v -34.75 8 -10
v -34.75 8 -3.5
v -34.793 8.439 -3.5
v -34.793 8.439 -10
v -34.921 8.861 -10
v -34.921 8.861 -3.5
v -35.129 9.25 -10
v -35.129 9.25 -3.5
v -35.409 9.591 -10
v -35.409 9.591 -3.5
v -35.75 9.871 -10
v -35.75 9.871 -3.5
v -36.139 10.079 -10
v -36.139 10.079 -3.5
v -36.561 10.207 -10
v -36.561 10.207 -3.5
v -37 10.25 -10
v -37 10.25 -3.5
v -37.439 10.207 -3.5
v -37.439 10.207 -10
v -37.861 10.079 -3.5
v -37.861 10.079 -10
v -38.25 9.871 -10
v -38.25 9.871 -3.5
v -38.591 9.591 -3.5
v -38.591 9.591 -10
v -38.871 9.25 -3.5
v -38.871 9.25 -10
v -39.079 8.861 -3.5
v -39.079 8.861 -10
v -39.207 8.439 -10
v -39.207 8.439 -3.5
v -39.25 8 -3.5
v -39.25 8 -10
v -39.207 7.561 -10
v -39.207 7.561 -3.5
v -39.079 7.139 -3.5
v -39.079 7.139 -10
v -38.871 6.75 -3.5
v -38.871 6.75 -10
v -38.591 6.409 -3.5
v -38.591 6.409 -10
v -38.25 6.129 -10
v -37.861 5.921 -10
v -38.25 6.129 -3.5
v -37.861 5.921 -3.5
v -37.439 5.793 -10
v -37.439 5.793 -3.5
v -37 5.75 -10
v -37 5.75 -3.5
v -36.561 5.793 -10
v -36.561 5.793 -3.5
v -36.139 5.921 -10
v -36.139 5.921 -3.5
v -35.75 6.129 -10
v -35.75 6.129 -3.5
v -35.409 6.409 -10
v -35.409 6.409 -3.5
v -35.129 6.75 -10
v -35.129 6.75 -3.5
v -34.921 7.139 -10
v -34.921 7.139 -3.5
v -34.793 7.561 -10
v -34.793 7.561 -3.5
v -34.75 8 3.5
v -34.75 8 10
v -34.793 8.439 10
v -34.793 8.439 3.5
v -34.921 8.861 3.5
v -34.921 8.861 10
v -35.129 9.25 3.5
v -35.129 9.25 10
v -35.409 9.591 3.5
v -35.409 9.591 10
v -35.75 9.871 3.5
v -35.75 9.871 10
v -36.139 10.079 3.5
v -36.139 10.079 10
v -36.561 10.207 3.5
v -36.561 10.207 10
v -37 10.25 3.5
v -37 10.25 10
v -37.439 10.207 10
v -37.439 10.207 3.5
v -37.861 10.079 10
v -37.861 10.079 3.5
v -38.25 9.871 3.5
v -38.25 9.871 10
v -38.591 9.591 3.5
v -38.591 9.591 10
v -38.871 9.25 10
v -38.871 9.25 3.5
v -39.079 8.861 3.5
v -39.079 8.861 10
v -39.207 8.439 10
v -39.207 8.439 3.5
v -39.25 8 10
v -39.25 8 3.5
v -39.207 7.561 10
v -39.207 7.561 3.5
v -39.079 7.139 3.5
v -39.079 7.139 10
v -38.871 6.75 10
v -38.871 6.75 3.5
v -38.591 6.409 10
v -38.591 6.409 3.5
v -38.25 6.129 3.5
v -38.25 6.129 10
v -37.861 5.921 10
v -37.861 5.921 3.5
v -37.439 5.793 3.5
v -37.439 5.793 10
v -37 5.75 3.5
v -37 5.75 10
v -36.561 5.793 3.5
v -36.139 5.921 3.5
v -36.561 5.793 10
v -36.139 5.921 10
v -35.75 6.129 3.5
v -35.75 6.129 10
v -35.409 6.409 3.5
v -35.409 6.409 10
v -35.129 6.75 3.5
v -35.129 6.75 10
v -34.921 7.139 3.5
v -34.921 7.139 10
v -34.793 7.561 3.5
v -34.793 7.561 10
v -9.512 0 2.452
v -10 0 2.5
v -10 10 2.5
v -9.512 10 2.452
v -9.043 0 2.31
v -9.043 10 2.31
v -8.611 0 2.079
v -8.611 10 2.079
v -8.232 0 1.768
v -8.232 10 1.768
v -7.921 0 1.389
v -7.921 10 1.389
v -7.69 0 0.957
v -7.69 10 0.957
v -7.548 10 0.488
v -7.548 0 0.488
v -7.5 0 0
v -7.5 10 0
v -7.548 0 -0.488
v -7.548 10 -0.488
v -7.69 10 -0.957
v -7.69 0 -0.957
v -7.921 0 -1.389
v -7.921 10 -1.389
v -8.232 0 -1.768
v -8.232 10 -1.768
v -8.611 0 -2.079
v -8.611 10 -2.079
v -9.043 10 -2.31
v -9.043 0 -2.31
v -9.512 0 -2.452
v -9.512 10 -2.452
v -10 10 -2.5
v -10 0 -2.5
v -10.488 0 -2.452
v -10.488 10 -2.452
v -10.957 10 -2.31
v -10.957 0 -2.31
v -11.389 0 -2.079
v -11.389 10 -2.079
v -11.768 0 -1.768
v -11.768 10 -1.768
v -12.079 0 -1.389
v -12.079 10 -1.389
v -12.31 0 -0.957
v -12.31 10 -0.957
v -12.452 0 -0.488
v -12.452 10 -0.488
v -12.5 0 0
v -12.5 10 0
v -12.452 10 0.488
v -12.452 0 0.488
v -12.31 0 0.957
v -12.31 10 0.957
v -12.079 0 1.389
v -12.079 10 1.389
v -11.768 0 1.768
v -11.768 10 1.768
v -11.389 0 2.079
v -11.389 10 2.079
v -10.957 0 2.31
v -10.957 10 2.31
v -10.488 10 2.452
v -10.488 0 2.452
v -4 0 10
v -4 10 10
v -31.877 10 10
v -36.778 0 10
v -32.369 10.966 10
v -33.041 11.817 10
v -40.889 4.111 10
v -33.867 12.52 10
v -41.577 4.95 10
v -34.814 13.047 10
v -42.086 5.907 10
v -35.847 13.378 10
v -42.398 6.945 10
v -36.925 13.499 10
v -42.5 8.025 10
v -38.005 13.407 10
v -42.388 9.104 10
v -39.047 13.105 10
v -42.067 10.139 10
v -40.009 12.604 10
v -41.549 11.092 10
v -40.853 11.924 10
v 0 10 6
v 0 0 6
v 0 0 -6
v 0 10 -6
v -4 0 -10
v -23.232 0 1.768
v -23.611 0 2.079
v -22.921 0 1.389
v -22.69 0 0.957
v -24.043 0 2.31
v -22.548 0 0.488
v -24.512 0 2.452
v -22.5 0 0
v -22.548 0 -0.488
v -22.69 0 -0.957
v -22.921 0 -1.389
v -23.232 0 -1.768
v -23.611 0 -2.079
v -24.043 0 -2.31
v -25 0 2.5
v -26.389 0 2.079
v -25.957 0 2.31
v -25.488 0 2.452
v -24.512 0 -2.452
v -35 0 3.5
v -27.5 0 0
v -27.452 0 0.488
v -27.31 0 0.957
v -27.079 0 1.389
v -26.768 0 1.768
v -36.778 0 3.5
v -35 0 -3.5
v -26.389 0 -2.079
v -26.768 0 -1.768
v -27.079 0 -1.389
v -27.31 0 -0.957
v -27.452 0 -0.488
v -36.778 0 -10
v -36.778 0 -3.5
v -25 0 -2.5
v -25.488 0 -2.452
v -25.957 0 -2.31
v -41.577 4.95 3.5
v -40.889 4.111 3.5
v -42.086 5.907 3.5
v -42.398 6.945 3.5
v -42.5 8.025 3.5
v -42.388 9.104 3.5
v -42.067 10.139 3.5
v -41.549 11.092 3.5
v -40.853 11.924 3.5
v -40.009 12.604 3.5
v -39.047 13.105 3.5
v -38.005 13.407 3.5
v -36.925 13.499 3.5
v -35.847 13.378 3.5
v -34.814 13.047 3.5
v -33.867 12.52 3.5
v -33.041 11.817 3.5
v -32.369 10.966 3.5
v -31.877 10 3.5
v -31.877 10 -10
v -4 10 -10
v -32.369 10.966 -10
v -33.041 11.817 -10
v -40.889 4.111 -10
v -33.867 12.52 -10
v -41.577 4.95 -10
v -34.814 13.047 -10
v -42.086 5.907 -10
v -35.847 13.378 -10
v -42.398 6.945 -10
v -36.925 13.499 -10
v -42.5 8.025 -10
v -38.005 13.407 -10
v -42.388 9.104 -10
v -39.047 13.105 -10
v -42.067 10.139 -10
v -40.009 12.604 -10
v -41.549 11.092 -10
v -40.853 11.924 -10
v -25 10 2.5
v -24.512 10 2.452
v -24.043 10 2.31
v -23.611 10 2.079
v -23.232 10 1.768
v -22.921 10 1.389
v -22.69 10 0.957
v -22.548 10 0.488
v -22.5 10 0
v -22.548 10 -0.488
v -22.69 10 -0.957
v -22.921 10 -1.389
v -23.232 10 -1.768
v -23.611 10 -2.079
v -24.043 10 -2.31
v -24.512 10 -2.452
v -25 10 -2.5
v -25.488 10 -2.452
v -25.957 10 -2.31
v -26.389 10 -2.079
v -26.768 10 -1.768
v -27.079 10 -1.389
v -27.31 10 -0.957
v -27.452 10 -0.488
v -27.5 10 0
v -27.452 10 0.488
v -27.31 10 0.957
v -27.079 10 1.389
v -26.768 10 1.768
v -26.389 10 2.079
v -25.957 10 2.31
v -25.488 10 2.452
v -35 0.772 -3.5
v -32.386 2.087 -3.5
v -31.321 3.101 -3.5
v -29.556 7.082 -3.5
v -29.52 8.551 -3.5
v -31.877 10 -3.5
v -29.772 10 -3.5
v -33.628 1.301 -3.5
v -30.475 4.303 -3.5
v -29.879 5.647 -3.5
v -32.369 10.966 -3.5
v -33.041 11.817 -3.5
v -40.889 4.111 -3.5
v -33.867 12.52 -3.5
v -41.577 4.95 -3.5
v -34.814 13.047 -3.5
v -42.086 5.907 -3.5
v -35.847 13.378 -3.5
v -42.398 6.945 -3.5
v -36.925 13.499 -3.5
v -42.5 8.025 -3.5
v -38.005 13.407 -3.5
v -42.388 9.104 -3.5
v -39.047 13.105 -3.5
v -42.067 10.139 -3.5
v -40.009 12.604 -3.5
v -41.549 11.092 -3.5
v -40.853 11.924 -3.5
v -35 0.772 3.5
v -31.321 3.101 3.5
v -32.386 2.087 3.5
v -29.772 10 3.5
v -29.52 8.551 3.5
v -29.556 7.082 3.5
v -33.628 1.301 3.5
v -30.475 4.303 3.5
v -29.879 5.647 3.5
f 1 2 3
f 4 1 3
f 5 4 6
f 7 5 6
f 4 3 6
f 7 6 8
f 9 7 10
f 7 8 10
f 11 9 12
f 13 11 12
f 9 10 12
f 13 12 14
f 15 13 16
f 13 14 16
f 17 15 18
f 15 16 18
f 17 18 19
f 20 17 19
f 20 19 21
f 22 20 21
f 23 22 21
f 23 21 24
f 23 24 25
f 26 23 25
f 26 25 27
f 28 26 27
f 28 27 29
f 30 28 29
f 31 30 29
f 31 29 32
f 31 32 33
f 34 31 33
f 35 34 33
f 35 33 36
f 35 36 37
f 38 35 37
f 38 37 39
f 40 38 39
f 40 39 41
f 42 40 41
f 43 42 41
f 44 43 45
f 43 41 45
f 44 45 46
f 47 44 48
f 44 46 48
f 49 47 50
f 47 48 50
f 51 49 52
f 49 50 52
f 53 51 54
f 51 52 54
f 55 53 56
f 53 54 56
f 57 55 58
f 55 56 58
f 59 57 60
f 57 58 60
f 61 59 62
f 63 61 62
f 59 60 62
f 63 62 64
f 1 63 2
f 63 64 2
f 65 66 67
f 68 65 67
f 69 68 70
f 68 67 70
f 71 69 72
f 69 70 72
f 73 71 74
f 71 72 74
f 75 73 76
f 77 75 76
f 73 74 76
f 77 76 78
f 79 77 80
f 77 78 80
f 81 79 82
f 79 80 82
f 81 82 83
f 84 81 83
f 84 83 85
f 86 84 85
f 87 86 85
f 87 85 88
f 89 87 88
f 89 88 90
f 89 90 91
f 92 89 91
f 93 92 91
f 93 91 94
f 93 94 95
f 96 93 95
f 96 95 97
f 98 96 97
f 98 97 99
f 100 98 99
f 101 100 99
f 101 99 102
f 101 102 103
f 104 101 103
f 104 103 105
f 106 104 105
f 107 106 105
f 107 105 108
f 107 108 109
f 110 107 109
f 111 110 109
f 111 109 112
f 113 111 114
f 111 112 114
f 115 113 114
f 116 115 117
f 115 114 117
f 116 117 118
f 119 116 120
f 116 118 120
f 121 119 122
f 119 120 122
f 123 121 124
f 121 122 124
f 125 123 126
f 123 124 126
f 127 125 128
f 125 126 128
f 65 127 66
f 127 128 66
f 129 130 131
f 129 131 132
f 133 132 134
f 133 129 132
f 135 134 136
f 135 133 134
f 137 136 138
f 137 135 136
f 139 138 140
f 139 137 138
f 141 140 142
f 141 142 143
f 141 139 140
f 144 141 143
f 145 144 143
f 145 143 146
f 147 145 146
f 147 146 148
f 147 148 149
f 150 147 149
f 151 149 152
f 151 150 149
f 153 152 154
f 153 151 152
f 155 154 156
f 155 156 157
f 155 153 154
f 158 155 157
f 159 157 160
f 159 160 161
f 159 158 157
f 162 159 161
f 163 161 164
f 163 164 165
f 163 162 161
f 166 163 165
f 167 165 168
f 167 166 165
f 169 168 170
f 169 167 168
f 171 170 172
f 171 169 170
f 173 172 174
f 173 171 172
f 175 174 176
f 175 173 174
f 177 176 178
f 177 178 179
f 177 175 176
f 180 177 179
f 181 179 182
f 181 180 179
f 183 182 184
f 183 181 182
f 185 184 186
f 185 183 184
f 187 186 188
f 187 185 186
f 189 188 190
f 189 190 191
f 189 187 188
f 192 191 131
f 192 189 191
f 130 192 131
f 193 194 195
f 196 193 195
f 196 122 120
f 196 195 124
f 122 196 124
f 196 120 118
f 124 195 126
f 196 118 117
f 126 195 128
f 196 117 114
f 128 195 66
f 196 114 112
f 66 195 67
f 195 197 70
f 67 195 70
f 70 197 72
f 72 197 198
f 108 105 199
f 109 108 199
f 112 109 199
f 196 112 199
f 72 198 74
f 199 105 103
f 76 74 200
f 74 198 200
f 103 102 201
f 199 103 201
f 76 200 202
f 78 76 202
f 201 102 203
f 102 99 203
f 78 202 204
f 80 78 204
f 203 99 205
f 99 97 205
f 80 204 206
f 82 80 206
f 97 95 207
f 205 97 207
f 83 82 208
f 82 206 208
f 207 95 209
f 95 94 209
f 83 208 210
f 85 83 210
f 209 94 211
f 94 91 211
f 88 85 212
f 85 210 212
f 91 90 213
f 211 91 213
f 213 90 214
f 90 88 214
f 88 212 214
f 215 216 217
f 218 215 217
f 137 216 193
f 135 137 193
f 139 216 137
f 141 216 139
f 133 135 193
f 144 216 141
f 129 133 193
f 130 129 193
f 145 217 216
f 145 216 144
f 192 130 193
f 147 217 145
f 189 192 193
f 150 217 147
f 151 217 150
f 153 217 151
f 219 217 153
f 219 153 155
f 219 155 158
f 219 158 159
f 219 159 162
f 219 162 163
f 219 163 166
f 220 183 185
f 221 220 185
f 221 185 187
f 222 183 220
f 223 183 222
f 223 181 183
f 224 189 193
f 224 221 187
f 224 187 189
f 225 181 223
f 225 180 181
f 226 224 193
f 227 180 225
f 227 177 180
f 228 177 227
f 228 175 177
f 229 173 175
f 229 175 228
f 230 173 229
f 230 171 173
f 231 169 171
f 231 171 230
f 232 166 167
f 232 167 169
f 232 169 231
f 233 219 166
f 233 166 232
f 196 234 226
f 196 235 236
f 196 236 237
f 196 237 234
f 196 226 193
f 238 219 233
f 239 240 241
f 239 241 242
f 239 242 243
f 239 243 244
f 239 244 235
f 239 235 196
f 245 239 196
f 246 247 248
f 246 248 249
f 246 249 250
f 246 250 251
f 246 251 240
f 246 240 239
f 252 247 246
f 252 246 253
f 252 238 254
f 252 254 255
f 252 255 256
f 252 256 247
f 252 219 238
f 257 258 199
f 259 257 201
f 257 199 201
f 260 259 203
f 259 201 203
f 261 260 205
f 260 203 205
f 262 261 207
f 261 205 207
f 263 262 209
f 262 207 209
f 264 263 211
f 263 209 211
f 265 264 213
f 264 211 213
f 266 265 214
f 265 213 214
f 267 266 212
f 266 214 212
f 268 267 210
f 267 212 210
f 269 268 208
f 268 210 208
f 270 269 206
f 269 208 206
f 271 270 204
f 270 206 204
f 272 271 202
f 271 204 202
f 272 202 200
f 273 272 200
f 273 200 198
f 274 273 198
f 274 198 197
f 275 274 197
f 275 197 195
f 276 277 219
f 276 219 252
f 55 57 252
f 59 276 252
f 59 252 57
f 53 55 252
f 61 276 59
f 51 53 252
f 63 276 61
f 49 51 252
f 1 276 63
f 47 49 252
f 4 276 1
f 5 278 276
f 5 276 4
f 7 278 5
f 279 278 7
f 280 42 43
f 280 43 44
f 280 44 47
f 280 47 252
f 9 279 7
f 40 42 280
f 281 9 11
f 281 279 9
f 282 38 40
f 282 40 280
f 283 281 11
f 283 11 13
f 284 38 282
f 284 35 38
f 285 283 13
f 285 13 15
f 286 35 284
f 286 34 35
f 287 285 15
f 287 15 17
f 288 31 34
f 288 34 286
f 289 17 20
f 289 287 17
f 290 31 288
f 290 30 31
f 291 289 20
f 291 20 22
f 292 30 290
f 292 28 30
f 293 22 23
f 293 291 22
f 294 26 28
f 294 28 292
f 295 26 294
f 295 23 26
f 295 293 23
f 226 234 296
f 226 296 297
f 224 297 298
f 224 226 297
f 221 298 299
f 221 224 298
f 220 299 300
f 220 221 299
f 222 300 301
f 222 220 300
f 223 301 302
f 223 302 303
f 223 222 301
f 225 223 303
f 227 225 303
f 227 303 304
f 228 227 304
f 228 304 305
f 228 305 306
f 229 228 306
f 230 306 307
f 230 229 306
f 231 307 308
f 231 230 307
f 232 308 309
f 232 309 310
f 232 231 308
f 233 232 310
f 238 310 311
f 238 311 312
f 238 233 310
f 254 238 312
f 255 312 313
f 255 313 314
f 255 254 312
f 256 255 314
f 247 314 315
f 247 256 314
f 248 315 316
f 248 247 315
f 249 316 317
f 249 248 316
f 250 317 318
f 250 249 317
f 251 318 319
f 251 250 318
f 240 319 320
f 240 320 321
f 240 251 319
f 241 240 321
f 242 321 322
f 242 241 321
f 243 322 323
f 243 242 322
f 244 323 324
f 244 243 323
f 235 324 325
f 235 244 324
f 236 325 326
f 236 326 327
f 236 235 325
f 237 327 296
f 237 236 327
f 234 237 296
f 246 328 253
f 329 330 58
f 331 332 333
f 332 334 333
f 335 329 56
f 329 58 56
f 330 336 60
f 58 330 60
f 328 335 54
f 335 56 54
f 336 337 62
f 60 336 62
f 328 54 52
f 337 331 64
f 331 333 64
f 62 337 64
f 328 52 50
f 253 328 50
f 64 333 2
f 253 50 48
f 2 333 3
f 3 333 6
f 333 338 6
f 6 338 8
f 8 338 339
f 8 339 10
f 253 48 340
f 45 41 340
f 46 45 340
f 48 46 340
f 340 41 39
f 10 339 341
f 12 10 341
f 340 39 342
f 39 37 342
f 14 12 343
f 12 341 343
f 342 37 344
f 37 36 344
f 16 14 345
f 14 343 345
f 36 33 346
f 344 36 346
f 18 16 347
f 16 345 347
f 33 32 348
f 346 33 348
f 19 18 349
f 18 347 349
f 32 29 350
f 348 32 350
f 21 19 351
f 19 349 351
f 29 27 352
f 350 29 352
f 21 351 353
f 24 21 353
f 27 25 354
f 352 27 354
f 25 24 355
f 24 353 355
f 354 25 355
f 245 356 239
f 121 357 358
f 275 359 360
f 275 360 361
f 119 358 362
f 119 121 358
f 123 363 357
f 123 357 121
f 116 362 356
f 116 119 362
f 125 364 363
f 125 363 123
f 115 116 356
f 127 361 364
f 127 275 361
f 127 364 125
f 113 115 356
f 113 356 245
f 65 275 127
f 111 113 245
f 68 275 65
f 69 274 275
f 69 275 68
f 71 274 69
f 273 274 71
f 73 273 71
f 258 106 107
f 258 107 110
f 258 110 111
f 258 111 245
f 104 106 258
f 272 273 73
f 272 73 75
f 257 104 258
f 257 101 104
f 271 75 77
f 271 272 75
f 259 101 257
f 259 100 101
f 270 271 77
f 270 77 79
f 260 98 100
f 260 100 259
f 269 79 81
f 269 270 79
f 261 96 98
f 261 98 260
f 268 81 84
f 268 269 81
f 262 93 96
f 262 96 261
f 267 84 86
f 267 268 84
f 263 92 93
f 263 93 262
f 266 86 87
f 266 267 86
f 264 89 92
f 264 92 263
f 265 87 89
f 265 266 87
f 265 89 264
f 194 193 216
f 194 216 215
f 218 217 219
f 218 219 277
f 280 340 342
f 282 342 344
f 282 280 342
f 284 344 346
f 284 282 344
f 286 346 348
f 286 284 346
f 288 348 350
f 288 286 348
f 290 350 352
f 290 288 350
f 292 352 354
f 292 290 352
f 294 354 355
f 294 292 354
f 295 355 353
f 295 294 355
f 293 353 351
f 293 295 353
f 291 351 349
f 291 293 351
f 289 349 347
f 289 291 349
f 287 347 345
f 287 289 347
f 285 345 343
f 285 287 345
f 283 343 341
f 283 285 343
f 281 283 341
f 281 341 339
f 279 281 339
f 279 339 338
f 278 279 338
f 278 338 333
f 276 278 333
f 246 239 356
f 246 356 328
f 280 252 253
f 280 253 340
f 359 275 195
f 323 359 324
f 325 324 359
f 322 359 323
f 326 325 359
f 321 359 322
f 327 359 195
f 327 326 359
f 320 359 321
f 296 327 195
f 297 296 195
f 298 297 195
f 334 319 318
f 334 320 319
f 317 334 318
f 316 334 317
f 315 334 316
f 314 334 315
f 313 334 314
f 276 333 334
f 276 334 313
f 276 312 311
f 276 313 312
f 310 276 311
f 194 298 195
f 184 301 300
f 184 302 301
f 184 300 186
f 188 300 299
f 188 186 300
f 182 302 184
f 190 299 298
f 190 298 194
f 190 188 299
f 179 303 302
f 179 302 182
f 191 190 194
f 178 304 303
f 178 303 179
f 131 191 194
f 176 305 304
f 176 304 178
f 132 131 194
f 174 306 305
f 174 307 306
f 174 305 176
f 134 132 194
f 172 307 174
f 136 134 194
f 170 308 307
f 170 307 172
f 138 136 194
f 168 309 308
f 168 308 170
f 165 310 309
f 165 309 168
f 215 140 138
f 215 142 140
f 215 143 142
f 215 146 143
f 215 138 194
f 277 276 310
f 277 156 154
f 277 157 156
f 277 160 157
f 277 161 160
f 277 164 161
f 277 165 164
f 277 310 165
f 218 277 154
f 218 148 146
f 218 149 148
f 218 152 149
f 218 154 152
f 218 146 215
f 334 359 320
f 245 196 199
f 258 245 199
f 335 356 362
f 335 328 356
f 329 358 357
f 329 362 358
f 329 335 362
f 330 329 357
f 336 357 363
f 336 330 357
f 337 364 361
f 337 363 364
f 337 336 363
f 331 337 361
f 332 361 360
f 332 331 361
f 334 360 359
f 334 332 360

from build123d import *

# Parameters (mm, degrees)
SKETCH1_W           = 35
SKETCH1_H           = 20
SKETCH1_R           = 2.5
BOSS_EXTRUDE1_DEPTH = 10
BOSS_EXTRUDE2_DEPTH = 6.5
SKETCH3_R           = 7.5
CUT_EXTRUDE1_DEPTH  = 7
SKETCH4_R           = 2.25
CUT_EXTRUDE2_DEPTH  = 49.872282533
CHAMFER1_SIZE       = 4


with BuildPart() as part:
    # Sketch1 → Boss-Extrude1 (new body)
    with BuildSketch(Plane(origin=(0, 0, 0), x_dir=(1, 0, 0), z_dir=(0, 1, 0))):
        with Locations((-17.5, 0)):
            Rectangle(SKETCH1_W, SKETCH1_H)
        with Locations(Location((-10, 0, 0), (0, 0, 270))):
            Circle(SKETCH1_R, mode=Mode.SUBTRACT)
        with Locations(Location((-25, 0, 0), (0, 0, 270))):
            Circle(SKETCH1_R, mode=Mode.SUBTRACT)
    extrude(amount=BOSS_EXTRUDE1_DEPTH)

    # Sketch2 → Boss-Extrude2 (add)
    with BuildSketch(Plane.XY.offset(10)):
        with BuildLine():
            Line((-35, 0), (-36.778174593, 0))
            Line((-36.778174593, 0), (-40.889087297, 4.110912703))
            ThreePointArc((-40.889087297, 4.110912703), (-35.871686573, 13.383020417), (-35, 2.876524617))
            Line((-35, 2.876524617), (-35, 0))
        make_face()
    boss_extrude2 = extrude(amount=-BOSS_EXTRUDE2_DEPTH)

    # Mirror1: Boss-Extrude2 across plane
    add(boss_extrude2.mirror(Plane.XY))

    # Sketch3 → Cut-Extrude1 (cut)
    with BuildSketch(Plane.XY.offset(-3.5)):
        with Locations((-37, 8)):
            Circle(SKETCH3_R)
    extrude(amount=CUT_EXTRUDE1_DEPTH, mode=Mode.SUBTRACT)

    # Sketch4 → Cut-Extrude2 (cut, through all)
    with BuildSketch(Plane.XY.offset(10)):
        with Locations((-37, 8)):
            Circle(SKETCH4_R)
    extrude(amount=-CUT_EXTRUDE2_DEPTH, mode=Mode.SUBTRACT)

    # Chamfer1
    chamfer1_edges = [part.edges().sort_by_distance(p)[0] for p in [
        (0, 5, -10),
        (0, 5, 10),
    ]]
    chamfer(chamfer1_edges, length=CHAMFER1_SIZE)


solid = part.part
